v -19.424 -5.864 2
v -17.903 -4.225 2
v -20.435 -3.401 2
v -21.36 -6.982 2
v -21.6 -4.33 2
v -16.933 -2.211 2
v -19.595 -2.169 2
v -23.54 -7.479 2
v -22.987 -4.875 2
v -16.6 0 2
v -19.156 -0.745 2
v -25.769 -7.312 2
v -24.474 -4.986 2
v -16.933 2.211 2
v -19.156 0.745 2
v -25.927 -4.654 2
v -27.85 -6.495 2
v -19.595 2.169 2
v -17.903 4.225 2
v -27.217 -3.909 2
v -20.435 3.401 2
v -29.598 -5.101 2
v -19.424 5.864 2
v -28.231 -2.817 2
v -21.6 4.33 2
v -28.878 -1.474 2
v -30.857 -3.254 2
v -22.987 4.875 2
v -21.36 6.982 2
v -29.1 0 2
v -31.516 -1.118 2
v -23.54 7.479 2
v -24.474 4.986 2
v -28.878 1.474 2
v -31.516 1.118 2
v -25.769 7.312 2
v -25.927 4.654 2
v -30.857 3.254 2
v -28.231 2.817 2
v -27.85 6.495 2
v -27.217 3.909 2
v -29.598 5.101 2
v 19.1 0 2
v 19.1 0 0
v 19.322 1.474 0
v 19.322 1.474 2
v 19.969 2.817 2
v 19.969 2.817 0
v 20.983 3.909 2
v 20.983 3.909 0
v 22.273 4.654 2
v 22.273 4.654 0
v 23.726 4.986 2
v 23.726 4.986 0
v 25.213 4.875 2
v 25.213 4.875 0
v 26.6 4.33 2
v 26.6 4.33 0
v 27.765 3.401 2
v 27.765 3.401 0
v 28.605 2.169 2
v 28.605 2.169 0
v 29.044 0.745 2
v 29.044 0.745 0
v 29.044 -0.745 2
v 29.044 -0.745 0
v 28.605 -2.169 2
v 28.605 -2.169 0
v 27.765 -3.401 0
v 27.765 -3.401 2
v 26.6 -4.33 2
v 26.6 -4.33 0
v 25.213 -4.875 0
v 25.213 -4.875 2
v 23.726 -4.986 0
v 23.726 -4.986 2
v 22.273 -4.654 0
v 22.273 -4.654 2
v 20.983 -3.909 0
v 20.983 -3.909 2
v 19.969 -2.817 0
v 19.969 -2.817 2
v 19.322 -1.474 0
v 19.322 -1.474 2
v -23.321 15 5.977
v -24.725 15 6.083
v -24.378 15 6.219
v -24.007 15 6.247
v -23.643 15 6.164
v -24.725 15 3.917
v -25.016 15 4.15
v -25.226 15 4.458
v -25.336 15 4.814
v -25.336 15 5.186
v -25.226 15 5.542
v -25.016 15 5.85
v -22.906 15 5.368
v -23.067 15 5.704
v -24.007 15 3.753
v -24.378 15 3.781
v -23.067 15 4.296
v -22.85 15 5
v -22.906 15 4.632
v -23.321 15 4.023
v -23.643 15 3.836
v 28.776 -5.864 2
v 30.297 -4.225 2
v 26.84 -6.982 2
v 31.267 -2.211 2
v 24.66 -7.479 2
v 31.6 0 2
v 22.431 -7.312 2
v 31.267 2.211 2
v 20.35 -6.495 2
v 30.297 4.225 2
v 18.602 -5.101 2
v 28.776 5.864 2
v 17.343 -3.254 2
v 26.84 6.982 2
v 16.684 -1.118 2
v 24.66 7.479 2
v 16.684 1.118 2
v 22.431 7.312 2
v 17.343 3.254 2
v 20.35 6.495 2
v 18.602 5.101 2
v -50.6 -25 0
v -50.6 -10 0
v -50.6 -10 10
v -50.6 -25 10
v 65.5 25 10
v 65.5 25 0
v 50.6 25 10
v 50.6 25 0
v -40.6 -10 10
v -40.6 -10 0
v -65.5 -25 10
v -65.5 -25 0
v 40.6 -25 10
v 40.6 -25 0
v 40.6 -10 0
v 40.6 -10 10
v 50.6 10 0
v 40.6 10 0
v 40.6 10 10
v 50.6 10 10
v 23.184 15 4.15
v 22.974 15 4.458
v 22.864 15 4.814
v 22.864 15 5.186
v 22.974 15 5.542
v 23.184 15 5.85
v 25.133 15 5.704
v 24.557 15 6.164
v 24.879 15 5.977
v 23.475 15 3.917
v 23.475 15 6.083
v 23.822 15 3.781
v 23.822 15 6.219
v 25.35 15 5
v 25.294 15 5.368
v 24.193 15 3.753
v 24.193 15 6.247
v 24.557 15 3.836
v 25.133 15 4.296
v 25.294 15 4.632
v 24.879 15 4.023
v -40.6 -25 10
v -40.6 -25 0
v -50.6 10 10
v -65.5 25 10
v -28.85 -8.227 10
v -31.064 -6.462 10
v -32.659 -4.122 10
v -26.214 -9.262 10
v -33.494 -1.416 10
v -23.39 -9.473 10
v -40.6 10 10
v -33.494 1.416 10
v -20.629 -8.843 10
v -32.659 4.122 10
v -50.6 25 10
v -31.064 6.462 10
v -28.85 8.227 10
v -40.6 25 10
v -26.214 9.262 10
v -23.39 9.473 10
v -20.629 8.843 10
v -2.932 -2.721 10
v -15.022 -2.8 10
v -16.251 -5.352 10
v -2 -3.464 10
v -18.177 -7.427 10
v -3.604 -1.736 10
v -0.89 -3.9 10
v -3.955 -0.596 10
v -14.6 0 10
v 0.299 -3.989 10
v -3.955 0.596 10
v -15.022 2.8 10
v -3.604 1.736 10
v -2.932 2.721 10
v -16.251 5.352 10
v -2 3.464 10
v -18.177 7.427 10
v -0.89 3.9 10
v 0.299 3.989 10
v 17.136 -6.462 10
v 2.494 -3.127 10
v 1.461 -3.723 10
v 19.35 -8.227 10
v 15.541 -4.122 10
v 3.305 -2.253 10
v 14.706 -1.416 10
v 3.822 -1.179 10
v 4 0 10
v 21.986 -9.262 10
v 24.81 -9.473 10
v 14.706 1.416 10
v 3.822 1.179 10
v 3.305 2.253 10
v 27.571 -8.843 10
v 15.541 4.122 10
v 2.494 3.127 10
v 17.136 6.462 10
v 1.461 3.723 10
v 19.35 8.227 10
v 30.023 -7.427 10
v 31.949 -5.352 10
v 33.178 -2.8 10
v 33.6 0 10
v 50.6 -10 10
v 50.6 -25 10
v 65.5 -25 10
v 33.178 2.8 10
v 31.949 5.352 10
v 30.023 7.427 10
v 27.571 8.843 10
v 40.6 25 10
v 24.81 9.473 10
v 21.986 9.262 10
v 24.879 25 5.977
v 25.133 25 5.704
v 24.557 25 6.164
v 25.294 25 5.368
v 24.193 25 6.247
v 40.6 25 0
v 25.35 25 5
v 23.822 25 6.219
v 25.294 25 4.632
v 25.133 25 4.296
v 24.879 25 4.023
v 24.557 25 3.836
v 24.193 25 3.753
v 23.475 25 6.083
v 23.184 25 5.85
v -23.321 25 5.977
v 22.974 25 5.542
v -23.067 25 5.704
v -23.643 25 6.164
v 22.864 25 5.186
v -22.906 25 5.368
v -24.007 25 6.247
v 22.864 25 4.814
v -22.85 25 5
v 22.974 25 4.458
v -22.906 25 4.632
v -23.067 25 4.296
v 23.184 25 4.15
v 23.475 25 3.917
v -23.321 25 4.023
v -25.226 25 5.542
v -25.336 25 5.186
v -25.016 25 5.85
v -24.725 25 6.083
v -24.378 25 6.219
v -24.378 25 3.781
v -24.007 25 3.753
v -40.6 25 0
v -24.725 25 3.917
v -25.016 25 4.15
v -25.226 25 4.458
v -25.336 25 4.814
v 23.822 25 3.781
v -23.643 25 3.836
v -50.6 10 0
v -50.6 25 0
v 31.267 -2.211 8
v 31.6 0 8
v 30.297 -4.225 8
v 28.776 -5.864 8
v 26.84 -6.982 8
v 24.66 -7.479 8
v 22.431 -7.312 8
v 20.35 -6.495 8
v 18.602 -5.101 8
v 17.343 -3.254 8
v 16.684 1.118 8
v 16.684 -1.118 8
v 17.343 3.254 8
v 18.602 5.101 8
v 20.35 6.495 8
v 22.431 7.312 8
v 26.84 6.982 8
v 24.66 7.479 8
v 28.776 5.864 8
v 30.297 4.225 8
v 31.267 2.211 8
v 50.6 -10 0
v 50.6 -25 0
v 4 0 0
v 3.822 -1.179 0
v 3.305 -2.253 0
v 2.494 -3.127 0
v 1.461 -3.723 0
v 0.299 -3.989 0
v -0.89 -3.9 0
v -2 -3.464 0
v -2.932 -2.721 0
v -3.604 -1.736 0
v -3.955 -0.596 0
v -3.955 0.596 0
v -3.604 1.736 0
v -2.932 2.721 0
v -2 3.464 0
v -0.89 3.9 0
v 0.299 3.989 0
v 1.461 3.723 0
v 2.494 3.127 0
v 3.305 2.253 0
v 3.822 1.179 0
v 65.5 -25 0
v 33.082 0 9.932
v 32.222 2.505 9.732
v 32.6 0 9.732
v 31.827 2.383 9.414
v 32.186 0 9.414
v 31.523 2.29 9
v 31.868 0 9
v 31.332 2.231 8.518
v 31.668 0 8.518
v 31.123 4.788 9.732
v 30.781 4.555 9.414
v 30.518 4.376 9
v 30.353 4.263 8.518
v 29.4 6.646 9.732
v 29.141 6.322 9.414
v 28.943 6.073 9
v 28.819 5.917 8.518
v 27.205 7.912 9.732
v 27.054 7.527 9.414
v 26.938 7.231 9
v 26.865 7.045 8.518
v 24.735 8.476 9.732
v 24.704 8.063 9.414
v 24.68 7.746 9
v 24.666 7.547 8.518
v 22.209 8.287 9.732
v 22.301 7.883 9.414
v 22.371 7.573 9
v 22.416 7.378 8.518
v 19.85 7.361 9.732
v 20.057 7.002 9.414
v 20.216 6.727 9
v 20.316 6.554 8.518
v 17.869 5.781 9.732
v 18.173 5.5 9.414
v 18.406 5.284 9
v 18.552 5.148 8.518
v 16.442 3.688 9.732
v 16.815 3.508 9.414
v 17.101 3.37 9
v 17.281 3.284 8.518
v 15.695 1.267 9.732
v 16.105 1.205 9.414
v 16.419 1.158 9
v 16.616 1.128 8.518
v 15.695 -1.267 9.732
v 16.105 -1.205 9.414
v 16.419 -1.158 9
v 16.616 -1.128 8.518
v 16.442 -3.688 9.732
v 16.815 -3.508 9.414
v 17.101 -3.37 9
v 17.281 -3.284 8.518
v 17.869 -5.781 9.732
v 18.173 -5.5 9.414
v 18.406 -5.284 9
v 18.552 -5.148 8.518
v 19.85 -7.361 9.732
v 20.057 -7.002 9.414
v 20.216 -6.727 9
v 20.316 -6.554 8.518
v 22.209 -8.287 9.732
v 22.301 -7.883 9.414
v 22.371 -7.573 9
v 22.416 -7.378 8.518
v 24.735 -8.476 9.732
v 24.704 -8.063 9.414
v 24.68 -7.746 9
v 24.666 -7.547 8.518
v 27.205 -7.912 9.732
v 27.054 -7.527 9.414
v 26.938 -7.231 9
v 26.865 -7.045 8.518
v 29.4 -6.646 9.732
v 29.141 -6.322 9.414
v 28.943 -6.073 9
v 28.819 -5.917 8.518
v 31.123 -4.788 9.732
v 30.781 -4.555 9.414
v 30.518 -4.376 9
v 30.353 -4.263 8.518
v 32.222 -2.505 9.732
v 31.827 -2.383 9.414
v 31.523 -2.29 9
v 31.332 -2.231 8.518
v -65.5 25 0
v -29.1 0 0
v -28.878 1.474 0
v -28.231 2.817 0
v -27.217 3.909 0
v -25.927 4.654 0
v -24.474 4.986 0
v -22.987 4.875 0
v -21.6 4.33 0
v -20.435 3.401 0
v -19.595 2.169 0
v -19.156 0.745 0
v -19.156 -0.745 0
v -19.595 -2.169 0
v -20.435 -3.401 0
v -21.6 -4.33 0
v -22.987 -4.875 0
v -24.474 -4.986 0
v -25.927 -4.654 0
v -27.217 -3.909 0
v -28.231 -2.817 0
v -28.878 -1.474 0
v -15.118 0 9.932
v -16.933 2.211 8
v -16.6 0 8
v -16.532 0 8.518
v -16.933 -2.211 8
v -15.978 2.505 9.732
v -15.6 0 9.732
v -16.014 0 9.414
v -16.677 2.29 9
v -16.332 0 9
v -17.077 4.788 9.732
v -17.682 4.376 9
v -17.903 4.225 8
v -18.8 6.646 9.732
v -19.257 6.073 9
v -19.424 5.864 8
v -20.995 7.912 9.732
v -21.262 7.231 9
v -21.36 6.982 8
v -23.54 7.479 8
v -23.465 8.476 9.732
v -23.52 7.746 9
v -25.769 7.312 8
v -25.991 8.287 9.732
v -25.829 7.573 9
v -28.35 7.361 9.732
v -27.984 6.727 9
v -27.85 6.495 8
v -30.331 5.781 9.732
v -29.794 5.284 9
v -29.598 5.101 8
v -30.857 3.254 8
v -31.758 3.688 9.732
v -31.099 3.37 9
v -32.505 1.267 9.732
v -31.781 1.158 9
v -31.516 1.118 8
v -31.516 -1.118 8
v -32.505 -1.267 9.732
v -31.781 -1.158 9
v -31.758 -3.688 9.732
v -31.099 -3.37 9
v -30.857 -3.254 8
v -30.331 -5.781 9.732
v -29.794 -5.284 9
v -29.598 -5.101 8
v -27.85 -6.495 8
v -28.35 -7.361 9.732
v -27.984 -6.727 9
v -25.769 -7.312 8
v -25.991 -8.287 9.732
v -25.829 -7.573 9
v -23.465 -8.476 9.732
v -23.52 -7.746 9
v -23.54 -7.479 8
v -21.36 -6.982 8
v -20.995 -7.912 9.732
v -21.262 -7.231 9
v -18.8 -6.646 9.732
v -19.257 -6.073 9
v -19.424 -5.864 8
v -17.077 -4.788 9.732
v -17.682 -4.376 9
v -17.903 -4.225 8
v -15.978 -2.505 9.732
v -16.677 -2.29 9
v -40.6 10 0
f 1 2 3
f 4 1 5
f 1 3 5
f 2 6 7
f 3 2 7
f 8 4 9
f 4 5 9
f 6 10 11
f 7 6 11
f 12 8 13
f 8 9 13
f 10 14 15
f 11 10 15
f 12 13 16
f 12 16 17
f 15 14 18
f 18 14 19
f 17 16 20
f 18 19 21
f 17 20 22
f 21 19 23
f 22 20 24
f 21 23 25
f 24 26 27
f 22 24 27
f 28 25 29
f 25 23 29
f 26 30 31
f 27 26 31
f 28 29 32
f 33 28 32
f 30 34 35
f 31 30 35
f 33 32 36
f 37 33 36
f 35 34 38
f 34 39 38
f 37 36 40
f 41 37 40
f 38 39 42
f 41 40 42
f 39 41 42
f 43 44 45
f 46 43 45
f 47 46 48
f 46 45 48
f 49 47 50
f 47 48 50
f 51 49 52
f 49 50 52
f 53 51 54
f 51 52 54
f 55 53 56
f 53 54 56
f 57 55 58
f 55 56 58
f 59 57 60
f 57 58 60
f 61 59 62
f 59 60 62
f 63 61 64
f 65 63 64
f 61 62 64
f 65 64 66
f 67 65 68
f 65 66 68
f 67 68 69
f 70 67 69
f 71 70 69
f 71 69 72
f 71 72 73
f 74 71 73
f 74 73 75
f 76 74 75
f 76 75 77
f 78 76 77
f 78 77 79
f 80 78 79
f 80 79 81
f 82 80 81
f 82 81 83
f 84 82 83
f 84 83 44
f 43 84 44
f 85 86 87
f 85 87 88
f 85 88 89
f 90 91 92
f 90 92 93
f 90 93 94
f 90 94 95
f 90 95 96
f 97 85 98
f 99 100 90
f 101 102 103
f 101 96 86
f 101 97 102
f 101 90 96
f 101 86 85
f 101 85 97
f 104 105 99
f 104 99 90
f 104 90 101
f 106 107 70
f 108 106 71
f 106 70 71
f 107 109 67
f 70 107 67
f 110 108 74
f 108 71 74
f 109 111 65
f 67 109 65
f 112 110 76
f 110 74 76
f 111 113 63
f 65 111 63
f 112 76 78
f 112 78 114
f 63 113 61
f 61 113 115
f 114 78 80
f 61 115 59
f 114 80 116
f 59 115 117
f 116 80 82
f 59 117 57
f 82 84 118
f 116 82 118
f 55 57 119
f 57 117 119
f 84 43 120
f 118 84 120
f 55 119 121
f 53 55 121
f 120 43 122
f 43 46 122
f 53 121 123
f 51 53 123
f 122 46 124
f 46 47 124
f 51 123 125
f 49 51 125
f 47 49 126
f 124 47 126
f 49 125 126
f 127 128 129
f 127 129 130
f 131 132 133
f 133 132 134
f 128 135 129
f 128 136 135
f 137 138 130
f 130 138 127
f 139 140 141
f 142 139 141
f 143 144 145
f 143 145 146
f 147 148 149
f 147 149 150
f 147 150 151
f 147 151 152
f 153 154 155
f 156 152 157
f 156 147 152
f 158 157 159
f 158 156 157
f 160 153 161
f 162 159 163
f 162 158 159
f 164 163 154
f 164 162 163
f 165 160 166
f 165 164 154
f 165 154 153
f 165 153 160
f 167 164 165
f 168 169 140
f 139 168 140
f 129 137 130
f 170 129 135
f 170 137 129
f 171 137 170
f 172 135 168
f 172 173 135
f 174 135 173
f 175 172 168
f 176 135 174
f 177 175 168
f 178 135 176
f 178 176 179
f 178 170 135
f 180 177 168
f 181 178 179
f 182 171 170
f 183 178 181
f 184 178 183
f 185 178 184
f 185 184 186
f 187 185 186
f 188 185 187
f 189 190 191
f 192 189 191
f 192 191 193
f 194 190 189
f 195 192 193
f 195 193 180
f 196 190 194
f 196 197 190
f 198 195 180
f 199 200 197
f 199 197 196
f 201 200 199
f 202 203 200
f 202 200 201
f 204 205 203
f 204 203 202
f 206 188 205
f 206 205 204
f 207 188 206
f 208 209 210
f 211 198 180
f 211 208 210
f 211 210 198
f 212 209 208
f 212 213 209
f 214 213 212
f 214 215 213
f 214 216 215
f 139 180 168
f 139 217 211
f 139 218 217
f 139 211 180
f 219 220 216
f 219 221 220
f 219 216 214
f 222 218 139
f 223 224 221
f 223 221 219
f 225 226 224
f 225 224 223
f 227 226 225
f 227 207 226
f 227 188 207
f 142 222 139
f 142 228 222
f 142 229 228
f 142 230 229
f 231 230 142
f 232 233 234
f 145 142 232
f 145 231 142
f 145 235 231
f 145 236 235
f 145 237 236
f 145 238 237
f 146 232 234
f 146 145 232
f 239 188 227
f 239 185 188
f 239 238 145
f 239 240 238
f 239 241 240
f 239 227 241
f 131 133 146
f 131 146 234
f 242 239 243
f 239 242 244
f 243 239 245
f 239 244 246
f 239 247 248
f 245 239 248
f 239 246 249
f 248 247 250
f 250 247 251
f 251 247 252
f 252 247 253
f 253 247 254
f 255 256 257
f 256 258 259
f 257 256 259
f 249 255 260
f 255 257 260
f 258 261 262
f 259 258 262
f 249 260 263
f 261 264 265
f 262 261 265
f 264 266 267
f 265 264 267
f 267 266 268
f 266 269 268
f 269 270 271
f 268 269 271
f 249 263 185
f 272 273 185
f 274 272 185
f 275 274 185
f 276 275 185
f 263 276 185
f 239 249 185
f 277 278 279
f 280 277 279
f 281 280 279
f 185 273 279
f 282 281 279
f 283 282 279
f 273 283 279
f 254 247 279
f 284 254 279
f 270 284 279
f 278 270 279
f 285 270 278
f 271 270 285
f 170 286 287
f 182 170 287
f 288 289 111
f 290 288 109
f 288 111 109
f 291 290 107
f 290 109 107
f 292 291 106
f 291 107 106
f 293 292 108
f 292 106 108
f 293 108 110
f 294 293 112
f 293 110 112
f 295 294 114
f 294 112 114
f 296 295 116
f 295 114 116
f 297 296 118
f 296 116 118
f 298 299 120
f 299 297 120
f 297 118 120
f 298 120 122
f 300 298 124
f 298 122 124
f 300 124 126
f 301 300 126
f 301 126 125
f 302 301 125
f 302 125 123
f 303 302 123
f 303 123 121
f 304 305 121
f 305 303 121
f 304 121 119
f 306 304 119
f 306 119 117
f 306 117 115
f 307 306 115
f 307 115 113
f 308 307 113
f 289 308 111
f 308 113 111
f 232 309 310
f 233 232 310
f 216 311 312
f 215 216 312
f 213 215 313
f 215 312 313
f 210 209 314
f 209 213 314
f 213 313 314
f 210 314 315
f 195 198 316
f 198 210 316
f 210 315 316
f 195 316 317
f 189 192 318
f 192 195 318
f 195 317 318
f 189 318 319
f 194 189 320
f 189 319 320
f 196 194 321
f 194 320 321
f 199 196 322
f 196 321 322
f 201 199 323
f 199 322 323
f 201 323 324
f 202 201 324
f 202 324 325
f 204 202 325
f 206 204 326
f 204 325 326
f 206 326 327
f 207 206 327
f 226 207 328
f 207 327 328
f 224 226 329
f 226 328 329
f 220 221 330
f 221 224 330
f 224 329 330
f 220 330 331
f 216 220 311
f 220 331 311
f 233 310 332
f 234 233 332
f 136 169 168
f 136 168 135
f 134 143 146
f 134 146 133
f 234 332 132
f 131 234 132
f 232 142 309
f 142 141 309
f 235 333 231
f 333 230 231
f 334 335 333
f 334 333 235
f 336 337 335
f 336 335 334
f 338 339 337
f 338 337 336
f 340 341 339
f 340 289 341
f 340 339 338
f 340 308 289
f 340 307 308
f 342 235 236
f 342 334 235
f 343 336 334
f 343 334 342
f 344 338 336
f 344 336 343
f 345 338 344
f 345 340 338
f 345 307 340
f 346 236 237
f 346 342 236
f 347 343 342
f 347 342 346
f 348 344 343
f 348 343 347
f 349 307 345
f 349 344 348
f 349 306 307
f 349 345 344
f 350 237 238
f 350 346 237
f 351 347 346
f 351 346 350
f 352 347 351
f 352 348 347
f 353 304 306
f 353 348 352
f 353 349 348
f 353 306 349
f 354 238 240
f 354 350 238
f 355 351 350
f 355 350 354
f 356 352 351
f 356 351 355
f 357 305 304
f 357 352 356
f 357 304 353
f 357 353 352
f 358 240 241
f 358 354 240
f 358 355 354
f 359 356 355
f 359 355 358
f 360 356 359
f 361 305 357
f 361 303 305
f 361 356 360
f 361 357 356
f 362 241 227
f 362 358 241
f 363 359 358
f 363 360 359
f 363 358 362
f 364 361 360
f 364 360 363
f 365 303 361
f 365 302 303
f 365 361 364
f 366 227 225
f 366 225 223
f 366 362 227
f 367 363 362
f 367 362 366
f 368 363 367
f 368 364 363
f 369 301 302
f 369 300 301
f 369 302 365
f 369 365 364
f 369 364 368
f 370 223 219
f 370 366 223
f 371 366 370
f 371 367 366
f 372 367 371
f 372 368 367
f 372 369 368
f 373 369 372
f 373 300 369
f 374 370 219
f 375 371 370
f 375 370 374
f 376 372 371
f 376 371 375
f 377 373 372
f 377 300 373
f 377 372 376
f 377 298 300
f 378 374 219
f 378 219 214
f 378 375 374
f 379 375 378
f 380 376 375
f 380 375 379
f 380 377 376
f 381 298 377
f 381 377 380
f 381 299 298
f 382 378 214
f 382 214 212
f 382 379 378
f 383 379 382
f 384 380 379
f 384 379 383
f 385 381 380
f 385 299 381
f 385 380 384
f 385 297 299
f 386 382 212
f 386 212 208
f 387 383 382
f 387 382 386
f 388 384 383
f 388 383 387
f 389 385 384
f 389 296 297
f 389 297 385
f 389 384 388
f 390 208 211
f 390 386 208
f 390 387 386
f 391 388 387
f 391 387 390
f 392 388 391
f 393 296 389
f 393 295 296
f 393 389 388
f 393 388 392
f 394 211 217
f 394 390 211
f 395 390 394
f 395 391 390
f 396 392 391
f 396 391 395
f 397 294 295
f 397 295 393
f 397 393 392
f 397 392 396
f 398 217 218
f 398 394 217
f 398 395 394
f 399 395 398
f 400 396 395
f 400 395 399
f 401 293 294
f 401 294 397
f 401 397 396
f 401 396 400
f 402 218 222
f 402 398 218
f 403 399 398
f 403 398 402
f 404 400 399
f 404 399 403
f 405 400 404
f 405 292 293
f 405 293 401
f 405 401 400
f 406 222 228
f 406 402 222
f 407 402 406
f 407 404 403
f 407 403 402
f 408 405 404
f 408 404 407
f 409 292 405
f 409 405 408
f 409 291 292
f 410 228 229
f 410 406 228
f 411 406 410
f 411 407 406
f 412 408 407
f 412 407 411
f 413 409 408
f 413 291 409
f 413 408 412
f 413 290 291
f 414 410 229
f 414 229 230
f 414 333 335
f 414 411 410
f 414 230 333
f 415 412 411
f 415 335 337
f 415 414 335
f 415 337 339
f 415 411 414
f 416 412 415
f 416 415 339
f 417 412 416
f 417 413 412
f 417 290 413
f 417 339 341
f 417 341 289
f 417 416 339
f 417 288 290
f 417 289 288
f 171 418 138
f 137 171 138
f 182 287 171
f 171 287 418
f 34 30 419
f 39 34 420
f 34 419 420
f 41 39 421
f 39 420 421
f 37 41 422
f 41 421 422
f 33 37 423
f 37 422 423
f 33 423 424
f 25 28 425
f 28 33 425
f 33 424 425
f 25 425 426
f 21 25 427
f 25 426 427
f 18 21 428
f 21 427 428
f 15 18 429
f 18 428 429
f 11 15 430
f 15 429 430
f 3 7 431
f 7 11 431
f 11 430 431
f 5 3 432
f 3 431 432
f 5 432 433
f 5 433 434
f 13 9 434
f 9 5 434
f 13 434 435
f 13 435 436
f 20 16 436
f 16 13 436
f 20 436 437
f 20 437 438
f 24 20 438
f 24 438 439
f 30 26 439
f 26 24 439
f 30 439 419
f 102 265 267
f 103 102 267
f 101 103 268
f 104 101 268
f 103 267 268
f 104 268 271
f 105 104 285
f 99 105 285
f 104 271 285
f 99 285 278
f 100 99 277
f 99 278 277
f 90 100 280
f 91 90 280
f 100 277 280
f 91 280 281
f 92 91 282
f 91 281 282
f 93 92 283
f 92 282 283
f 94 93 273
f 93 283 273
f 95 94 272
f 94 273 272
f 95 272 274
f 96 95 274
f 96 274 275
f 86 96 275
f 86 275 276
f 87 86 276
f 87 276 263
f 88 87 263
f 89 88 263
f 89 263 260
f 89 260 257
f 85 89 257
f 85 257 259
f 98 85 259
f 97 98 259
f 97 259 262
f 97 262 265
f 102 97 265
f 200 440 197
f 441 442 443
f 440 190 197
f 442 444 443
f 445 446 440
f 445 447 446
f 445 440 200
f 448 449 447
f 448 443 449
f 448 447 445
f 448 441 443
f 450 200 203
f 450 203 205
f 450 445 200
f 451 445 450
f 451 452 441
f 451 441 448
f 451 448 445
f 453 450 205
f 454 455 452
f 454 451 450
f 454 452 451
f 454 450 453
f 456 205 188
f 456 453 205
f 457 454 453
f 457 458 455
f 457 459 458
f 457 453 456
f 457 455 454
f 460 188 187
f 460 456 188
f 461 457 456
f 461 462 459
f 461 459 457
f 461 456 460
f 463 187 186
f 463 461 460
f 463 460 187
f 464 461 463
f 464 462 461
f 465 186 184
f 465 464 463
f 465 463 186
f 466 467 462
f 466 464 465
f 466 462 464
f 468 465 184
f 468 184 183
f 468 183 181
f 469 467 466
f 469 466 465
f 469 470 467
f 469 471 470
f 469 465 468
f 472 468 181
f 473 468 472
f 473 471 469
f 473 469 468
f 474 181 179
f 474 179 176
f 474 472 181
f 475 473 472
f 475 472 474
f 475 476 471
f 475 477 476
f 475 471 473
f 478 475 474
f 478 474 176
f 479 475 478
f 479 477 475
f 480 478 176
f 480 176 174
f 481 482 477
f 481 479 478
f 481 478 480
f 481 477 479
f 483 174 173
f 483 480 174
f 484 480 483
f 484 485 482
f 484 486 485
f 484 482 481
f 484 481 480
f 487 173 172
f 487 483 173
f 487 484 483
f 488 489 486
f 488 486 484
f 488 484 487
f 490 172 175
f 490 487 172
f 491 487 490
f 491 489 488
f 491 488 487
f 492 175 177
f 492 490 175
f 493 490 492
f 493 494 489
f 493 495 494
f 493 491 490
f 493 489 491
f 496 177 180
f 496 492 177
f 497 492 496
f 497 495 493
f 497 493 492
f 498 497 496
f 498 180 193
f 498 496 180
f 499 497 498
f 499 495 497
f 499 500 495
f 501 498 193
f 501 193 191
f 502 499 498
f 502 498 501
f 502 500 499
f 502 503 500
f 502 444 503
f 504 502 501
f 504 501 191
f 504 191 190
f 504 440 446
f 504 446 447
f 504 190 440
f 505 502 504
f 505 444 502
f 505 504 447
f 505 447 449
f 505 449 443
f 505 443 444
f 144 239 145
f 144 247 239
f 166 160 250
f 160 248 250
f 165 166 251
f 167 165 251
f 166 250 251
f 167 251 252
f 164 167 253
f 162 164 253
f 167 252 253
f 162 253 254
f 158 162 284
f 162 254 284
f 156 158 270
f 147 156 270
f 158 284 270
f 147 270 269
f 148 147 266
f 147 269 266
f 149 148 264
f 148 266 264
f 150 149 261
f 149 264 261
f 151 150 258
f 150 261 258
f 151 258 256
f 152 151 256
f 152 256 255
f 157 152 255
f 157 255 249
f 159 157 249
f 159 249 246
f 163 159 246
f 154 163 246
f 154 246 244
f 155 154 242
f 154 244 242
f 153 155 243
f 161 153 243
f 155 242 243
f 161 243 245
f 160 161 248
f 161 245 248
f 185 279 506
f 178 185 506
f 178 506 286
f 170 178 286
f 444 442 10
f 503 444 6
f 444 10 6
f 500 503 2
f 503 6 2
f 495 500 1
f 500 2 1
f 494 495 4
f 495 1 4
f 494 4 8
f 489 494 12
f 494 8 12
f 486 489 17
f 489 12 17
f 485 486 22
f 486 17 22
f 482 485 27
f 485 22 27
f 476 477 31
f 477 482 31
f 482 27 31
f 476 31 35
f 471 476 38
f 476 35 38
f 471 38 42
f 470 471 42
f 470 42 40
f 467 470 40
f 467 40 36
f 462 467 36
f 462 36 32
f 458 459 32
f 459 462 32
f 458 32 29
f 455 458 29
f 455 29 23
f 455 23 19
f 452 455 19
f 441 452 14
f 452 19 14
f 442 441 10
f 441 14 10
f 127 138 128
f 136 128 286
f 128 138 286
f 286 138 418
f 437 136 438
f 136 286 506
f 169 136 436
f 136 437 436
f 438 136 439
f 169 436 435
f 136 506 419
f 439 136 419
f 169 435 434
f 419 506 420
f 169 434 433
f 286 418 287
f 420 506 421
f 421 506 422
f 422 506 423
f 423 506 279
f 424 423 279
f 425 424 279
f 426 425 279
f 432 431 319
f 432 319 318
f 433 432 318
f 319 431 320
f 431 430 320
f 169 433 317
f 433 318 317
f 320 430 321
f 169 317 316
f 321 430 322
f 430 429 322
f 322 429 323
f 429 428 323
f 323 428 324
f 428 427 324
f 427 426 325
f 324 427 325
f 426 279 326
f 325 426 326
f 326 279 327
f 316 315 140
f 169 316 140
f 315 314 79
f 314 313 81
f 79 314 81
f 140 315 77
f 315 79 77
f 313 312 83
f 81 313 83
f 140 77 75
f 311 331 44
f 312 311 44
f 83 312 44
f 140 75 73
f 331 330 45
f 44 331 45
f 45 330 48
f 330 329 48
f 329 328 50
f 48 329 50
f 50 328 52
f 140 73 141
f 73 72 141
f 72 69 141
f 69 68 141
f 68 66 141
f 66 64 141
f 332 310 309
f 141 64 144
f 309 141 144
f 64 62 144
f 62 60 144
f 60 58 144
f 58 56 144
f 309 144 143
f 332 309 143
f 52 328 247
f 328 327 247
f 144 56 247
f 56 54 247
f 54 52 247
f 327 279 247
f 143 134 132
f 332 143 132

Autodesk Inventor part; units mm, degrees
ref_plane "YZ Plane" through (0, 0, 0) normal (1, 0, 0) x (0, 1, 0)
ref_plane "XZ Plane" through (0, 0, 0) normal (0, 1, 0) x (-1, 0, 0)
ref_plane "XY Plane" through (0, 0, 0) normal (0, 0, 1) x (1, 0, 0)
sketch "Sketch1" plane through (0, 0, 0) normal (0, 0, 1) x (1, 0, 0)
  line L0 (65.5, 25) -> (-65.5, 25)
  line L1 (-65.5, 25) -> (-65.5, -25)
  line L2 (-65.5, -25) -> (65.5, -25)
  line L3 (65.5, -25) -> (65.5, 25)
  line L4 (-40.6, 25) -> (-40.6, 10)
  line L5 (-40.6, 10) -> (-50.6, 10)
  line L6 (-50.6, 10) -> (-50.6, 25)
  line L7 (-40.6, -25) -> (-40.6, -10)
  line L8 (-40.6, -10) -> (-50.6, -10)
  line L9 (-50.6, -10) -> (-50.6, -25)
  line L10 (40.6, 25) -> (40.6, 10)
  line L11 (40.6, 10) -> (50.6, 10)
  line L12 (50.6, 10) -> (50.6, 25)
  line L13 (40.6, -25) -> (40.6, -10)
  line L14 (40.6, -10) -> (50.6, -10)
  line L15 (50.6, -10) -> (50.6, -25)
  circle A0 centre (24.1, 0) radius 7.5
  circle A1 centre (-24.1, 0) radius 7.5
  circle A2 centre (24.1, 0) radius 7.5
  circle A3 centre (-24.1, 0) radius 7.5
  circle A4 centre (0, 0) radius 4
  dimension "d0" = 15
  dimension "d1" = 15
  dimension "d2" = 15
  dimension "d3" = 15
  dimension "d8" = 15
  dimension "d9" = 15
  dimension "d30" = 8
extrude "Extrusion2" add sketch "Sketch1" along normal blind 10 contours L3 L2 L15 L14 L13 L7 L8 L9 L1 L0 L6 L5 L4 L10 L11 L12 | A4
sketch "Sketch2" plane through (-40.6, 25, 0) normal (0, 1, 0) x (1, 0, 0)
  circle A0 centre (64.7, -5) radius 1.25
  circle A1 centre (16.5, -5) radius 1.25
  point P0 (40.6, 0)
  dimension "d15" = 2.5
  dimension "d16" = 2.5
extrude "Extrusion3" cut sketch "Sketch2" against normal blind 10
sketch "Sketch3" plane through (0, 0, 0) normal (0, 0, -1) x (-1, 0, 0)
  circle A0 centre (0, 0) radius 24.1
  circle A1 centre (-24.1, 0) radius 5
  circle A2 centre (24.1, 0) radius 5
  circle A3 centre (-24.1, 0) radius 7.5
  circle A4 centre (24.1, 0) radius 7.5
  dimension "d25" = 48.2
  dimension "d26" = 10
  dimension "d27" = 10
extrude "Extrusion6" add sketch "Sketch3" against normal blind 2 contours A2 A0 A4 | A0 A4 A2 | A3 A0 A1 | A0 A1 A3
extrude "Extrusion7" cut sketch "Sketch1" along normal blind 10 contours A4
fillet "Fillet1" radius 2 2 edges at (-31.6, 0, 10) (16.6, 0, 10)
properties part number "prepazka-sablona"
